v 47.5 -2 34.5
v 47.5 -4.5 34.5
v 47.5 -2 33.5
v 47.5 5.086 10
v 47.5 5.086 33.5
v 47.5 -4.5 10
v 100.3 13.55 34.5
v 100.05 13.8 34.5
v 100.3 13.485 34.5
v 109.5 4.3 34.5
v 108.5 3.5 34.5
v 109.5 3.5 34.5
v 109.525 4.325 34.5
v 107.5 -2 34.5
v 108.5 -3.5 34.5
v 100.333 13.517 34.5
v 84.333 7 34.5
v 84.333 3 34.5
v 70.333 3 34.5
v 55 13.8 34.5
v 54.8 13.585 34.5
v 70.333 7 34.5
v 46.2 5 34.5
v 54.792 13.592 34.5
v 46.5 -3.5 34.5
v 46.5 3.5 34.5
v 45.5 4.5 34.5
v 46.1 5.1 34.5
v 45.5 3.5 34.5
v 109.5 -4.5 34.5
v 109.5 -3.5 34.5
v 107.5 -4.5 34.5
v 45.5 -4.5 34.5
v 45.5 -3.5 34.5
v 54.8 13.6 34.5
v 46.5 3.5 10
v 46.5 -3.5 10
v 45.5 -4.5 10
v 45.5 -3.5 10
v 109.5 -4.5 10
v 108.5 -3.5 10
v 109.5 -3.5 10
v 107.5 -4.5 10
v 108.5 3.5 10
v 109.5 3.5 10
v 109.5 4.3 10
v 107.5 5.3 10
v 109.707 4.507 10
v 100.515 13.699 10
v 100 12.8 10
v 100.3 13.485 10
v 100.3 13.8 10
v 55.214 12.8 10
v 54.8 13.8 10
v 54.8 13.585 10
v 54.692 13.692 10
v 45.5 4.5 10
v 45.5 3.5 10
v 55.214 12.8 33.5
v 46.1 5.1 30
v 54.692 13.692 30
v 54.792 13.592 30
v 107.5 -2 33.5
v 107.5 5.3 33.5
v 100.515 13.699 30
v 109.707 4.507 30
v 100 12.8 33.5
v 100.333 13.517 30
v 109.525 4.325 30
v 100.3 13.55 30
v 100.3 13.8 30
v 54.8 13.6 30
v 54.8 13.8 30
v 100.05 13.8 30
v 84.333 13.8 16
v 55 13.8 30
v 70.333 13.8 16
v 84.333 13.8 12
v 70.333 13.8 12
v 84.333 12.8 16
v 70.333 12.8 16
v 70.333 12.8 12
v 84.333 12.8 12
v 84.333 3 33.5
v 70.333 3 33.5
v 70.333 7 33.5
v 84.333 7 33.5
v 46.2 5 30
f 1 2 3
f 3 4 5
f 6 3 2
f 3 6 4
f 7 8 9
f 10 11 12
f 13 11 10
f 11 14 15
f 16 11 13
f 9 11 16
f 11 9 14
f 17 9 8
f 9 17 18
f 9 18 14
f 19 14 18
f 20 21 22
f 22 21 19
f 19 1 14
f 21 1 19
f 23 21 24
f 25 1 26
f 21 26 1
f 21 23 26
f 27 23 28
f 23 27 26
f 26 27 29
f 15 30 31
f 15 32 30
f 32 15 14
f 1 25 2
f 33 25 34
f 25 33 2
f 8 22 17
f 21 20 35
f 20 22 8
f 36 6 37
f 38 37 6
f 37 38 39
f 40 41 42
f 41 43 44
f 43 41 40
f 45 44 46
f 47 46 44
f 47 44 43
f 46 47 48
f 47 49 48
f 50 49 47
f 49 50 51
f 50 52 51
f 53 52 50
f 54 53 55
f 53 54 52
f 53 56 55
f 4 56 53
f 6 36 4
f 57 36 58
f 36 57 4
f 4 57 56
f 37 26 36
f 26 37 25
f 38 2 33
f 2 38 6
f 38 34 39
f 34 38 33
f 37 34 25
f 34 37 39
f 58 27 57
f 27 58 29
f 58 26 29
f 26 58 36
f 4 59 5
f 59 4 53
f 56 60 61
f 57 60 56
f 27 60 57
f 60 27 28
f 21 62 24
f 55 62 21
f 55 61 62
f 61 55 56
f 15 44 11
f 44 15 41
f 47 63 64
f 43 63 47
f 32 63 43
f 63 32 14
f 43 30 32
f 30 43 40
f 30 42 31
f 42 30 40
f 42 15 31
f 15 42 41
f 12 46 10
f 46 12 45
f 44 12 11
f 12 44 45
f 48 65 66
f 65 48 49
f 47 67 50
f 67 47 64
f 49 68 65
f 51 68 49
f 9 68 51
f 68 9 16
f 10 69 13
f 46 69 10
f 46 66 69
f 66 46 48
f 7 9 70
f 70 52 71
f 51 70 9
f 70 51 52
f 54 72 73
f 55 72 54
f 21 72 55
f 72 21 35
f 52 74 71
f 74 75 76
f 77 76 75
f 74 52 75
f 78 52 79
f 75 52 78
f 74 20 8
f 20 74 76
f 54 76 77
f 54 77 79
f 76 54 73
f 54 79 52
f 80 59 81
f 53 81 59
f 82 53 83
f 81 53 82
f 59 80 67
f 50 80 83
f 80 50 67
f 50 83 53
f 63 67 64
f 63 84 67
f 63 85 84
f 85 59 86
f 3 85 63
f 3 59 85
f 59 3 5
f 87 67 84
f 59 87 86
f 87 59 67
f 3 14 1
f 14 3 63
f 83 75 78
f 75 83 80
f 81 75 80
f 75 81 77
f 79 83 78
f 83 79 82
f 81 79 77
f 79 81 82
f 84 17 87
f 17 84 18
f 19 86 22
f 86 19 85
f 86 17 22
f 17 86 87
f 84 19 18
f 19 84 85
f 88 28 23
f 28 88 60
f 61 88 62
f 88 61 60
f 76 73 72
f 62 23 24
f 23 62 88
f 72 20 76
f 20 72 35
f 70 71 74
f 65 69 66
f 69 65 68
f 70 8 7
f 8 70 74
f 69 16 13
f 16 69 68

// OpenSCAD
echo(version=version());

font1 = "Liberation Sans";
font2 = "Segoe UI Emoji";

module letter(font, letter_size, letter_height, text) {
  linear_extrude(height = letter_height) {
    text(text, size = letter_size, font = font, halign = "center", valign = "center", $fn = 16);
  }
}

width=1;
z_h=34.5;
//z_h=10;
y_l=32;
part1_L=45.5;
part2_L=70;
part3_L=42.5;
spacer_diam=6;
spacer_width=2;

module spacer() {
    difference() {
        cylinder(z_h, (spacer_diam + spacer_width)/2, (spacer_diam + spacer_width)/2, true, $fn=50);
        cylinder(z_h, spacer_diam/2, spacer_diam/2, true, $fn=50);
    }
}

module front() {
    difference() {
        union() {
            translate([+part3_L+part2_L,0,z_h/2]) spacer();
            translate([+part3_L+part2_L+part1_L,0,z_h/2]) spacer();            
            translate([+part3_L+part2_L+spacer_diam/2,0,0]) cube([part1_L-(spacer_diam), width, z_h]);
            
            translate([part1_L+part2_L+part3_L,-y_l/2,0]) cube([width, (y_l-spacer_diam)/2, z_h*2/3]);
            translate([part2_L+part3_L-spacer_diam/2-width,-spacer_diam/2,0]) cube([width, spacer_diam, z_h]);
        }
        translate([part2_L+part3_L+spacer_diam/2, -4,z_h-4]) cube([15, 10, 4]); // strap front
    }
}

module middle() {
    difference() {
        union() {      
            translate([part3_L+spacer_diam/2+width,-4.5,10]) {
                cube([width, 10, z_h-10]);
                translate([-1,0,0]) cube([2, width, z_h-10]);
                translate([-1,8,0]) cube([2, width, z_h-10]);
                translate([-1,9,0])  rotate([0,0,-45]) cube([width, 13, z_h-10]);
            }
            translate([part2_L+part3_L-spacer_diam+1,-4.5,10]) {
                cube([width, 10, z_h-10]);
                cube([2, width, z_h-10]);
                translate([0,8,0]) cube([2, width, z_h-10]);
                translate([1.5,8.3,0]) rotate([0,0,45]) cube([width, 13, z_h-10]);
            }
            translate([part3_L+12.3,12.8,10]) cube([part2_L-24.5, width, z_h-10]);
            translate([part3_L+5,-2,z_h-width]) cube([part2_L-10, 15, width]);
        }
        translate([part3_L+part2_L/3+4.5,12,12]) cube([14, width*2, 4]);
        translate([part3_L+part2_L/3+4.5,3,z_h-width]) cube([14, 4, width*2]);
        translate([part3_L+3.7,5,30]) rotate([0,0,45]) cube([14, 6, 10]);
        translate([part3_L+part2_L-12.65,14,30]) rotate([0,0,-45]) cube([14, 6, 10]);
    }
}

module back() {
    difference() {
        union() {
            translate([0,0,z_h/2]) spacer();
            translate([+part3_L,0,z_h/2]) spacer();
            translate([(spacer_diam)/2,0,0]) cube([part3_L-(spacer_diam), width, z_h]);
            
            translate([-width,-y_l/2,0]) cube([width, (y_l-spacer_diam)/2, z_h]);
            translate([part3_L+spacer_diam/2,-spacer_diam/2,0]) cube([width, spacer_diam, z_h]);
        }
        translate([part3_L-19,-5,z_h-4]) cube([15, 10, 4]); // strap back        
    }
}

module side() {
    //front();
    middle();
    //back();
}

// FULL set with mirror
difference() {
    union() {
        side(); // left
        //translate([0,-y_l,0]) mirror([0,1,0]) side(); // right
    }
    
    // center-back
    translate([0,-y_l/2,7.5]) rotate([0,90,0]) cylinder(z_h,3.5,3.5, true);
    translate([-10/2,-(y_l+10)/2,z_h-5]) cube([10,10,5]);
    
    // center front
    translate([part1_L+part2_L+part3_L,-y_l/2,22]) rotate([0,90,0]) cylinder(z_h,y_l/2-spacer_diam/2,y_l/2-spacer_diam/2,true);    
}
